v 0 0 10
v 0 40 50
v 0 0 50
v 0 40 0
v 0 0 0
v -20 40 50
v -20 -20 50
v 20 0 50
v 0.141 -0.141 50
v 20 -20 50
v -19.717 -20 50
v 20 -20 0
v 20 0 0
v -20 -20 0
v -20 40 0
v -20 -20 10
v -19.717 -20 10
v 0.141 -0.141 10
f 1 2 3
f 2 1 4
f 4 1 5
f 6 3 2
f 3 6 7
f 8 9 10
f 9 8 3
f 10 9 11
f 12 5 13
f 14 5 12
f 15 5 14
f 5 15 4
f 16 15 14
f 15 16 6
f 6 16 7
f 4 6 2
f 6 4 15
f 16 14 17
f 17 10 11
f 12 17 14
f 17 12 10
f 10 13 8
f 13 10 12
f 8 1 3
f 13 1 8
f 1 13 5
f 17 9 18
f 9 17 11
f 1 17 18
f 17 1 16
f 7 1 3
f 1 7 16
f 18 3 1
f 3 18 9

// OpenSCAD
$fn=50;
q=30;
z=4;

module old() {
    difference() {
        union() {
            cube([q,q,q/z]);
            cube([q/z,q,q]);
        }
        translate([0,0,4.6]) rotate([0,68,0]) #cube([.5,20,20]);
        translate([10,10,0]) rotate([0,-45,0]) translate([0,0,-5]) #cylinder(20,d=2);
    }
}

a=45;
//a=68;
ww=20;
hh1=60;
hh2=40;
zz=50;
slit=.2;
module new() {
    difference() {
        union() {
            translate([-ww,-ww,0]) cube([ww,hh1,zz]);
            translate([-ww,-ww,0]) cube([hh2,ww,zz]);
        }
    #mirror([90,90,0]) translate([0,0,10]) rotate([0,0,a-90]) cube([slit,hh1,hh1]);
    }
}

//old();
new();
